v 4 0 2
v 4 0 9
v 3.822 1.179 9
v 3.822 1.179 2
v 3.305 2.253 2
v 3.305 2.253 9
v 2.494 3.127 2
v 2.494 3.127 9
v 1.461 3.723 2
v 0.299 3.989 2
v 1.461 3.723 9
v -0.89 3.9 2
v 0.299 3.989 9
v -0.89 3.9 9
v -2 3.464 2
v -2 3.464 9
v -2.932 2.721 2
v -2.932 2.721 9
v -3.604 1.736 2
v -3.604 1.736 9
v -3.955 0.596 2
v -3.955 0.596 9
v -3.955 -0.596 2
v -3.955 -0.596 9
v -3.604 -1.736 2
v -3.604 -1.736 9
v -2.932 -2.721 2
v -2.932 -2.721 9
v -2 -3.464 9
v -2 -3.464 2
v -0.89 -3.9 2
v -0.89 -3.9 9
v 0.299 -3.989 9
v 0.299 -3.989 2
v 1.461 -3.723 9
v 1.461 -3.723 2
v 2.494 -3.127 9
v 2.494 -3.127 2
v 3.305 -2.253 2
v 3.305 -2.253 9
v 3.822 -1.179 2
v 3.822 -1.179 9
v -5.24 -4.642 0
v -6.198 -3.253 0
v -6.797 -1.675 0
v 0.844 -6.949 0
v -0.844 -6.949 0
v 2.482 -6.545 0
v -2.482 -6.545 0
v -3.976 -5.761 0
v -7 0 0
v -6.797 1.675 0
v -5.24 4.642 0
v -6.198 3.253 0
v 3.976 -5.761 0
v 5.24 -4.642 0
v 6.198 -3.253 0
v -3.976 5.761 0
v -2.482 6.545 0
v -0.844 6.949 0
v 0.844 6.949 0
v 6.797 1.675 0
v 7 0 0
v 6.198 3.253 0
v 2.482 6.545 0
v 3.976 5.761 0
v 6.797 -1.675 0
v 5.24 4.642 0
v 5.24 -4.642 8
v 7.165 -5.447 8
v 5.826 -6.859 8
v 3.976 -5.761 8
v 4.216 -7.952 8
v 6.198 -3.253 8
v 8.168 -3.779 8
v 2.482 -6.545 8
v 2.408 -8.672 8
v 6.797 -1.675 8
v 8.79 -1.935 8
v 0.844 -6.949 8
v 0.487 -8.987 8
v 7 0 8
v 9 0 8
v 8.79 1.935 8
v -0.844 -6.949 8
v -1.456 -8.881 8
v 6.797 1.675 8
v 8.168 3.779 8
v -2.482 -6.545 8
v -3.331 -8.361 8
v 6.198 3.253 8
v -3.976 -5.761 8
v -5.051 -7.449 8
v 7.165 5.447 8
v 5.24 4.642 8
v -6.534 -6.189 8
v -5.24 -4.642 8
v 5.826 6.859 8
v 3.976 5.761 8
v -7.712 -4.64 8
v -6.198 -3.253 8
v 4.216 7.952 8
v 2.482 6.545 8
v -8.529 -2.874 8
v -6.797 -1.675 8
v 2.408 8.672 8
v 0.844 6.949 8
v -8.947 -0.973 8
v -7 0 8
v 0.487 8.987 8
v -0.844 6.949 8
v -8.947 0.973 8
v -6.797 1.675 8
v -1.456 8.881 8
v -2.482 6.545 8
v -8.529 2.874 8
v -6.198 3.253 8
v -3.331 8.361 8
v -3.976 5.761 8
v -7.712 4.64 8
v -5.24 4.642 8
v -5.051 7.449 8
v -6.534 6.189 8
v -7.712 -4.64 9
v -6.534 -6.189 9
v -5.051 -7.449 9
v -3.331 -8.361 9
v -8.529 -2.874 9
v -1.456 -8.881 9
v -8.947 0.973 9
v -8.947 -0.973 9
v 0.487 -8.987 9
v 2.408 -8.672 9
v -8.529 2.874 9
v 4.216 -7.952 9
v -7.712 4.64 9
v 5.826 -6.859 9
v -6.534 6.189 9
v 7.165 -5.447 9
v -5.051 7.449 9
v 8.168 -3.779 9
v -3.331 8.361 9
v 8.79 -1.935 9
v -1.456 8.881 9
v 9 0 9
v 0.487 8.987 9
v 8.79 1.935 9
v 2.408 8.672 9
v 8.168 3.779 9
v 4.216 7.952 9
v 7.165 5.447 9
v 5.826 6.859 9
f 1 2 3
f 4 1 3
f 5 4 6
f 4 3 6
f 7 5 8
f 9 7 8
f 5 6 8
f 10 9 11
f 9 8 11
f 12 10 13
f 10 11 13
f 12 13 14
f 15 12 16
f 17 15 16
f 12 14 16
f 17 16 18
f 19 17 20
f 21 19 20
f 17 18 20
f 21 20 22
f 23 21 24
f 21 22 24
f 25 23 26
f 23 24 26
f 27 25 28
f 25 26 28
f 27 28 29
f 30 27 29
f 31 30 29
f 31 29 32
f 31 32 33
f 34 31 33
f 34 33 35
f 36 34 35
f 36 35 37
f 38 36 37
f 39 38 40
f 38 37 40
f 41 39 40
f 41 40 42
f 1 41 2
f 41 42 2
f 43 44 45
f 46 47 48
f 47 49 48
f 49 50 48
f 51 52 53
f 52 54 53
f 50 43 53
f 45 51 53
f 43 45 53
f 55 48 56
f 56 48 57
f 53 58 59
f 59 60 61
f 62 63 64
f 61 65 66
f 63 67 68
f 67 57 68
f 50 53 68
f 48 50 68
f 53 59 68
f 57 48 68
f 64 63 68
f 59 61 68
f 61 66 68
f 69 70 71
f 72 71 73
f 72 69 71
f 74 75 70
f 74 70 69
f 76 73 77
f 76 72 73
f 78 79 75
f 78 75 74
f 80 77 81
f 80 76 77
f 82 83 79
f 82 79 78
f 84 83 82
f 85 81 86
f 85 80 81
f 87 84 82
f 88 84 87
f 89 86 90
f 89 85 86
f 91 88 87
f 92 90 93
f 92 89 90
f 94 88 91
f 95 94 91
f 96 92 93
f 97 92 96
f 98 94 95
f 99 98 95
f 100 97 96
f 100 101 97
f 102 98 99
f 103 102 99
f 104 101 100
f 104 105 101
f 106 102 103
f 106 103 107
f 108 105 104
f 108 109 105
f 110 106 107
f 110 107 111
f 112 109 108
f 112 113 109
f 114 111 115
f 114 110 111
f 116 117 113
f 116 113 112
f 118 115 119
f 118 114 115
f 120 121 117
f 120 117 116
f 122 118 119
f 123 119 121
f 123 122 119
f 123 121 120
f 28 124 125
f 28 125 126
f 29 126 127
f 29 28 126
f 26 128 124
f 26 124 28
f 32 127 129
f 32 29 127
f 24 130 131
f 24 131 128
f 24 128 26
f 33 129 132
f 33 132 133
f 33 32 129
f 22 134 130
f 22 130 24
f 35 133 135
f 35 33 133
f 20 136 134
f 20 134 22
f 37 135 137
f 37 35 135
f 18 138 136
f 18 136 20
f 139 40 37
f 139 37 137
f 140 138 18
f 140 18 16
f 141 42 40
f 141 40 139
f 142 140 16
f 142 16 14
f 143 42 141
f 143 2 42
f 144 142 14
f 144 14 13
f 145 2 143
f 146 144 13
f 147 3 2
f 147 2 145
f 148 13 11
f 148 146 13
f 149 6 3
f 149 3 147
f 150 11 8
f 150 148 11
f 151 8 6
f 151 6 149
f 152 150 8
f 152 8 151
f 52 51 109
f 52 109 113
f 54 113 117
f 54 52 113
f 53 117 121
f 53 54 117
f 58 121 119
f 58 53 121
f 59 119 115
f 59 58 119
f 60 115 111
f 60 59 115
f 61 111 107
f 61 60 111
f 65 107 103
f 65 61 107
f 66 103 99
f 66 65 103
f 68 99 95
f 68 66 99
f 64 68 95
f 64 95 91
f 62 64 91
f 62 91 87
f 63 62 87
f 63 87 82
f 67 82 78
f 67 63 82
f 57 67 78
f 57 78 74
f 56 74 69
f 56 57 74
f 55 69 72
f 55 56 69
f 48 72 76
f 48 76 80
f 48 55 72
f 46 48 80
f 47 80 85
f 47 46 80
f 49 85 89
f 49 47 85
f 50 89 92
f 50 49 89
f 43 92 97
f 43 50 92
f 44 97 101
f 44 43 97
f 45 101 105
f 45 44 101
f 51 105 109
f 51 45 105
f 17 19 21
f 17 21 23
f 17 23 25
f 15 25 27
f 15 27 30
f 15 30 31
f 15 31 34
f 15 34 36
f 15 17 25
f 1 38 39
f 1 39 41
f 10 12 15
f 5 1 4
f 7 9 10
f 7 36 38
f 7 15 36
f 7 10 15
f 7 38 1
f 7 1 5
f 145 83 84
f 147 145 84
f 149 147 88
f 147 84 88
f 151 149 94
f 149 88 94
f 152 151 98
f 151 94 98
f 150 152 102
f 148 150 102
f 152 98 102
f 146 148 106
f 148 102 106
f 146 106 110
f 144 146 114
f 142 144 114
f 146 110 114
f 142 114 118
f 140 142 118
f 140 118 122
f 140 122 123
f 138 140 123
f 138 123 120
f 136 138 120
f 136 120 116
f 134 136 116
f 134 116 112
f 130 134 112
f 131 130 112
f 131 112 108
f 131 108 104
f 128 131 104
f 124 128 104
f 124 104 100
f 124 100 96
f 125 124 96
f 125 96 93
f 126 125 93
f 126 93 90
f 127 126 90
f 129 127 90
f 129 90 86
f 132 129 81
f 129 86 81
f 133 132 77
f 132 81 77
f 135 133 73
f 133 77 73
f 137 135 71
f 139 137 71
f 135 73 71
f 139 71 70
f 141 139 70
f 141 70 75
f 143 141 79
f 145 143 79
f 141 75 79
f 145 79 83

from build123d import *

# Parameters (mm, degrees)
SKETCH2_R           = 9
BOSS_EXTRUDE1_DEPTH = 9
SKETCH3_R           = 4
CUT_EXTRUDE1_DEPTH  = 7
SKETCH4_R           = 9
SKETCH4_R_2         = 7
CUT_EXTRUDE2_DEPTH  = 8


with BuildPart() as part:
    # Sketch2 → Boss-Extrude1 (new body)
    with BuildSketch(Plane.XY):
        Circle(SKETCH2_R)
    extrude(amount=BOSS_EXTRUDE1_DEPTH)

    # Sketch3 → Cut-Extrude1 (cut)
    with BuildSketch(Plane.XY.offset(9)):
        Circle(SKETCH3_R)
    extrude(amount=-CUT_EXTRUDE1_DEPTH, mode=Mode.SUBTRACT)

    # Sketch4 → Cut-Extrude2 (cut)
    with BuildSketch(Plane(origin=(0, 0, 0), x_dir=(-1, 0, 0), z_dir=(0, 0, -1))):
        Circle(SKETCH4_R)
        Circle(SKETCH4_R_2, mode=Mode.SUBTRACT)
    extrude(amount=-CUT_EXTRUDE2_DEPTH, mode=Mode.SUBTRACT)


solid = part.part
